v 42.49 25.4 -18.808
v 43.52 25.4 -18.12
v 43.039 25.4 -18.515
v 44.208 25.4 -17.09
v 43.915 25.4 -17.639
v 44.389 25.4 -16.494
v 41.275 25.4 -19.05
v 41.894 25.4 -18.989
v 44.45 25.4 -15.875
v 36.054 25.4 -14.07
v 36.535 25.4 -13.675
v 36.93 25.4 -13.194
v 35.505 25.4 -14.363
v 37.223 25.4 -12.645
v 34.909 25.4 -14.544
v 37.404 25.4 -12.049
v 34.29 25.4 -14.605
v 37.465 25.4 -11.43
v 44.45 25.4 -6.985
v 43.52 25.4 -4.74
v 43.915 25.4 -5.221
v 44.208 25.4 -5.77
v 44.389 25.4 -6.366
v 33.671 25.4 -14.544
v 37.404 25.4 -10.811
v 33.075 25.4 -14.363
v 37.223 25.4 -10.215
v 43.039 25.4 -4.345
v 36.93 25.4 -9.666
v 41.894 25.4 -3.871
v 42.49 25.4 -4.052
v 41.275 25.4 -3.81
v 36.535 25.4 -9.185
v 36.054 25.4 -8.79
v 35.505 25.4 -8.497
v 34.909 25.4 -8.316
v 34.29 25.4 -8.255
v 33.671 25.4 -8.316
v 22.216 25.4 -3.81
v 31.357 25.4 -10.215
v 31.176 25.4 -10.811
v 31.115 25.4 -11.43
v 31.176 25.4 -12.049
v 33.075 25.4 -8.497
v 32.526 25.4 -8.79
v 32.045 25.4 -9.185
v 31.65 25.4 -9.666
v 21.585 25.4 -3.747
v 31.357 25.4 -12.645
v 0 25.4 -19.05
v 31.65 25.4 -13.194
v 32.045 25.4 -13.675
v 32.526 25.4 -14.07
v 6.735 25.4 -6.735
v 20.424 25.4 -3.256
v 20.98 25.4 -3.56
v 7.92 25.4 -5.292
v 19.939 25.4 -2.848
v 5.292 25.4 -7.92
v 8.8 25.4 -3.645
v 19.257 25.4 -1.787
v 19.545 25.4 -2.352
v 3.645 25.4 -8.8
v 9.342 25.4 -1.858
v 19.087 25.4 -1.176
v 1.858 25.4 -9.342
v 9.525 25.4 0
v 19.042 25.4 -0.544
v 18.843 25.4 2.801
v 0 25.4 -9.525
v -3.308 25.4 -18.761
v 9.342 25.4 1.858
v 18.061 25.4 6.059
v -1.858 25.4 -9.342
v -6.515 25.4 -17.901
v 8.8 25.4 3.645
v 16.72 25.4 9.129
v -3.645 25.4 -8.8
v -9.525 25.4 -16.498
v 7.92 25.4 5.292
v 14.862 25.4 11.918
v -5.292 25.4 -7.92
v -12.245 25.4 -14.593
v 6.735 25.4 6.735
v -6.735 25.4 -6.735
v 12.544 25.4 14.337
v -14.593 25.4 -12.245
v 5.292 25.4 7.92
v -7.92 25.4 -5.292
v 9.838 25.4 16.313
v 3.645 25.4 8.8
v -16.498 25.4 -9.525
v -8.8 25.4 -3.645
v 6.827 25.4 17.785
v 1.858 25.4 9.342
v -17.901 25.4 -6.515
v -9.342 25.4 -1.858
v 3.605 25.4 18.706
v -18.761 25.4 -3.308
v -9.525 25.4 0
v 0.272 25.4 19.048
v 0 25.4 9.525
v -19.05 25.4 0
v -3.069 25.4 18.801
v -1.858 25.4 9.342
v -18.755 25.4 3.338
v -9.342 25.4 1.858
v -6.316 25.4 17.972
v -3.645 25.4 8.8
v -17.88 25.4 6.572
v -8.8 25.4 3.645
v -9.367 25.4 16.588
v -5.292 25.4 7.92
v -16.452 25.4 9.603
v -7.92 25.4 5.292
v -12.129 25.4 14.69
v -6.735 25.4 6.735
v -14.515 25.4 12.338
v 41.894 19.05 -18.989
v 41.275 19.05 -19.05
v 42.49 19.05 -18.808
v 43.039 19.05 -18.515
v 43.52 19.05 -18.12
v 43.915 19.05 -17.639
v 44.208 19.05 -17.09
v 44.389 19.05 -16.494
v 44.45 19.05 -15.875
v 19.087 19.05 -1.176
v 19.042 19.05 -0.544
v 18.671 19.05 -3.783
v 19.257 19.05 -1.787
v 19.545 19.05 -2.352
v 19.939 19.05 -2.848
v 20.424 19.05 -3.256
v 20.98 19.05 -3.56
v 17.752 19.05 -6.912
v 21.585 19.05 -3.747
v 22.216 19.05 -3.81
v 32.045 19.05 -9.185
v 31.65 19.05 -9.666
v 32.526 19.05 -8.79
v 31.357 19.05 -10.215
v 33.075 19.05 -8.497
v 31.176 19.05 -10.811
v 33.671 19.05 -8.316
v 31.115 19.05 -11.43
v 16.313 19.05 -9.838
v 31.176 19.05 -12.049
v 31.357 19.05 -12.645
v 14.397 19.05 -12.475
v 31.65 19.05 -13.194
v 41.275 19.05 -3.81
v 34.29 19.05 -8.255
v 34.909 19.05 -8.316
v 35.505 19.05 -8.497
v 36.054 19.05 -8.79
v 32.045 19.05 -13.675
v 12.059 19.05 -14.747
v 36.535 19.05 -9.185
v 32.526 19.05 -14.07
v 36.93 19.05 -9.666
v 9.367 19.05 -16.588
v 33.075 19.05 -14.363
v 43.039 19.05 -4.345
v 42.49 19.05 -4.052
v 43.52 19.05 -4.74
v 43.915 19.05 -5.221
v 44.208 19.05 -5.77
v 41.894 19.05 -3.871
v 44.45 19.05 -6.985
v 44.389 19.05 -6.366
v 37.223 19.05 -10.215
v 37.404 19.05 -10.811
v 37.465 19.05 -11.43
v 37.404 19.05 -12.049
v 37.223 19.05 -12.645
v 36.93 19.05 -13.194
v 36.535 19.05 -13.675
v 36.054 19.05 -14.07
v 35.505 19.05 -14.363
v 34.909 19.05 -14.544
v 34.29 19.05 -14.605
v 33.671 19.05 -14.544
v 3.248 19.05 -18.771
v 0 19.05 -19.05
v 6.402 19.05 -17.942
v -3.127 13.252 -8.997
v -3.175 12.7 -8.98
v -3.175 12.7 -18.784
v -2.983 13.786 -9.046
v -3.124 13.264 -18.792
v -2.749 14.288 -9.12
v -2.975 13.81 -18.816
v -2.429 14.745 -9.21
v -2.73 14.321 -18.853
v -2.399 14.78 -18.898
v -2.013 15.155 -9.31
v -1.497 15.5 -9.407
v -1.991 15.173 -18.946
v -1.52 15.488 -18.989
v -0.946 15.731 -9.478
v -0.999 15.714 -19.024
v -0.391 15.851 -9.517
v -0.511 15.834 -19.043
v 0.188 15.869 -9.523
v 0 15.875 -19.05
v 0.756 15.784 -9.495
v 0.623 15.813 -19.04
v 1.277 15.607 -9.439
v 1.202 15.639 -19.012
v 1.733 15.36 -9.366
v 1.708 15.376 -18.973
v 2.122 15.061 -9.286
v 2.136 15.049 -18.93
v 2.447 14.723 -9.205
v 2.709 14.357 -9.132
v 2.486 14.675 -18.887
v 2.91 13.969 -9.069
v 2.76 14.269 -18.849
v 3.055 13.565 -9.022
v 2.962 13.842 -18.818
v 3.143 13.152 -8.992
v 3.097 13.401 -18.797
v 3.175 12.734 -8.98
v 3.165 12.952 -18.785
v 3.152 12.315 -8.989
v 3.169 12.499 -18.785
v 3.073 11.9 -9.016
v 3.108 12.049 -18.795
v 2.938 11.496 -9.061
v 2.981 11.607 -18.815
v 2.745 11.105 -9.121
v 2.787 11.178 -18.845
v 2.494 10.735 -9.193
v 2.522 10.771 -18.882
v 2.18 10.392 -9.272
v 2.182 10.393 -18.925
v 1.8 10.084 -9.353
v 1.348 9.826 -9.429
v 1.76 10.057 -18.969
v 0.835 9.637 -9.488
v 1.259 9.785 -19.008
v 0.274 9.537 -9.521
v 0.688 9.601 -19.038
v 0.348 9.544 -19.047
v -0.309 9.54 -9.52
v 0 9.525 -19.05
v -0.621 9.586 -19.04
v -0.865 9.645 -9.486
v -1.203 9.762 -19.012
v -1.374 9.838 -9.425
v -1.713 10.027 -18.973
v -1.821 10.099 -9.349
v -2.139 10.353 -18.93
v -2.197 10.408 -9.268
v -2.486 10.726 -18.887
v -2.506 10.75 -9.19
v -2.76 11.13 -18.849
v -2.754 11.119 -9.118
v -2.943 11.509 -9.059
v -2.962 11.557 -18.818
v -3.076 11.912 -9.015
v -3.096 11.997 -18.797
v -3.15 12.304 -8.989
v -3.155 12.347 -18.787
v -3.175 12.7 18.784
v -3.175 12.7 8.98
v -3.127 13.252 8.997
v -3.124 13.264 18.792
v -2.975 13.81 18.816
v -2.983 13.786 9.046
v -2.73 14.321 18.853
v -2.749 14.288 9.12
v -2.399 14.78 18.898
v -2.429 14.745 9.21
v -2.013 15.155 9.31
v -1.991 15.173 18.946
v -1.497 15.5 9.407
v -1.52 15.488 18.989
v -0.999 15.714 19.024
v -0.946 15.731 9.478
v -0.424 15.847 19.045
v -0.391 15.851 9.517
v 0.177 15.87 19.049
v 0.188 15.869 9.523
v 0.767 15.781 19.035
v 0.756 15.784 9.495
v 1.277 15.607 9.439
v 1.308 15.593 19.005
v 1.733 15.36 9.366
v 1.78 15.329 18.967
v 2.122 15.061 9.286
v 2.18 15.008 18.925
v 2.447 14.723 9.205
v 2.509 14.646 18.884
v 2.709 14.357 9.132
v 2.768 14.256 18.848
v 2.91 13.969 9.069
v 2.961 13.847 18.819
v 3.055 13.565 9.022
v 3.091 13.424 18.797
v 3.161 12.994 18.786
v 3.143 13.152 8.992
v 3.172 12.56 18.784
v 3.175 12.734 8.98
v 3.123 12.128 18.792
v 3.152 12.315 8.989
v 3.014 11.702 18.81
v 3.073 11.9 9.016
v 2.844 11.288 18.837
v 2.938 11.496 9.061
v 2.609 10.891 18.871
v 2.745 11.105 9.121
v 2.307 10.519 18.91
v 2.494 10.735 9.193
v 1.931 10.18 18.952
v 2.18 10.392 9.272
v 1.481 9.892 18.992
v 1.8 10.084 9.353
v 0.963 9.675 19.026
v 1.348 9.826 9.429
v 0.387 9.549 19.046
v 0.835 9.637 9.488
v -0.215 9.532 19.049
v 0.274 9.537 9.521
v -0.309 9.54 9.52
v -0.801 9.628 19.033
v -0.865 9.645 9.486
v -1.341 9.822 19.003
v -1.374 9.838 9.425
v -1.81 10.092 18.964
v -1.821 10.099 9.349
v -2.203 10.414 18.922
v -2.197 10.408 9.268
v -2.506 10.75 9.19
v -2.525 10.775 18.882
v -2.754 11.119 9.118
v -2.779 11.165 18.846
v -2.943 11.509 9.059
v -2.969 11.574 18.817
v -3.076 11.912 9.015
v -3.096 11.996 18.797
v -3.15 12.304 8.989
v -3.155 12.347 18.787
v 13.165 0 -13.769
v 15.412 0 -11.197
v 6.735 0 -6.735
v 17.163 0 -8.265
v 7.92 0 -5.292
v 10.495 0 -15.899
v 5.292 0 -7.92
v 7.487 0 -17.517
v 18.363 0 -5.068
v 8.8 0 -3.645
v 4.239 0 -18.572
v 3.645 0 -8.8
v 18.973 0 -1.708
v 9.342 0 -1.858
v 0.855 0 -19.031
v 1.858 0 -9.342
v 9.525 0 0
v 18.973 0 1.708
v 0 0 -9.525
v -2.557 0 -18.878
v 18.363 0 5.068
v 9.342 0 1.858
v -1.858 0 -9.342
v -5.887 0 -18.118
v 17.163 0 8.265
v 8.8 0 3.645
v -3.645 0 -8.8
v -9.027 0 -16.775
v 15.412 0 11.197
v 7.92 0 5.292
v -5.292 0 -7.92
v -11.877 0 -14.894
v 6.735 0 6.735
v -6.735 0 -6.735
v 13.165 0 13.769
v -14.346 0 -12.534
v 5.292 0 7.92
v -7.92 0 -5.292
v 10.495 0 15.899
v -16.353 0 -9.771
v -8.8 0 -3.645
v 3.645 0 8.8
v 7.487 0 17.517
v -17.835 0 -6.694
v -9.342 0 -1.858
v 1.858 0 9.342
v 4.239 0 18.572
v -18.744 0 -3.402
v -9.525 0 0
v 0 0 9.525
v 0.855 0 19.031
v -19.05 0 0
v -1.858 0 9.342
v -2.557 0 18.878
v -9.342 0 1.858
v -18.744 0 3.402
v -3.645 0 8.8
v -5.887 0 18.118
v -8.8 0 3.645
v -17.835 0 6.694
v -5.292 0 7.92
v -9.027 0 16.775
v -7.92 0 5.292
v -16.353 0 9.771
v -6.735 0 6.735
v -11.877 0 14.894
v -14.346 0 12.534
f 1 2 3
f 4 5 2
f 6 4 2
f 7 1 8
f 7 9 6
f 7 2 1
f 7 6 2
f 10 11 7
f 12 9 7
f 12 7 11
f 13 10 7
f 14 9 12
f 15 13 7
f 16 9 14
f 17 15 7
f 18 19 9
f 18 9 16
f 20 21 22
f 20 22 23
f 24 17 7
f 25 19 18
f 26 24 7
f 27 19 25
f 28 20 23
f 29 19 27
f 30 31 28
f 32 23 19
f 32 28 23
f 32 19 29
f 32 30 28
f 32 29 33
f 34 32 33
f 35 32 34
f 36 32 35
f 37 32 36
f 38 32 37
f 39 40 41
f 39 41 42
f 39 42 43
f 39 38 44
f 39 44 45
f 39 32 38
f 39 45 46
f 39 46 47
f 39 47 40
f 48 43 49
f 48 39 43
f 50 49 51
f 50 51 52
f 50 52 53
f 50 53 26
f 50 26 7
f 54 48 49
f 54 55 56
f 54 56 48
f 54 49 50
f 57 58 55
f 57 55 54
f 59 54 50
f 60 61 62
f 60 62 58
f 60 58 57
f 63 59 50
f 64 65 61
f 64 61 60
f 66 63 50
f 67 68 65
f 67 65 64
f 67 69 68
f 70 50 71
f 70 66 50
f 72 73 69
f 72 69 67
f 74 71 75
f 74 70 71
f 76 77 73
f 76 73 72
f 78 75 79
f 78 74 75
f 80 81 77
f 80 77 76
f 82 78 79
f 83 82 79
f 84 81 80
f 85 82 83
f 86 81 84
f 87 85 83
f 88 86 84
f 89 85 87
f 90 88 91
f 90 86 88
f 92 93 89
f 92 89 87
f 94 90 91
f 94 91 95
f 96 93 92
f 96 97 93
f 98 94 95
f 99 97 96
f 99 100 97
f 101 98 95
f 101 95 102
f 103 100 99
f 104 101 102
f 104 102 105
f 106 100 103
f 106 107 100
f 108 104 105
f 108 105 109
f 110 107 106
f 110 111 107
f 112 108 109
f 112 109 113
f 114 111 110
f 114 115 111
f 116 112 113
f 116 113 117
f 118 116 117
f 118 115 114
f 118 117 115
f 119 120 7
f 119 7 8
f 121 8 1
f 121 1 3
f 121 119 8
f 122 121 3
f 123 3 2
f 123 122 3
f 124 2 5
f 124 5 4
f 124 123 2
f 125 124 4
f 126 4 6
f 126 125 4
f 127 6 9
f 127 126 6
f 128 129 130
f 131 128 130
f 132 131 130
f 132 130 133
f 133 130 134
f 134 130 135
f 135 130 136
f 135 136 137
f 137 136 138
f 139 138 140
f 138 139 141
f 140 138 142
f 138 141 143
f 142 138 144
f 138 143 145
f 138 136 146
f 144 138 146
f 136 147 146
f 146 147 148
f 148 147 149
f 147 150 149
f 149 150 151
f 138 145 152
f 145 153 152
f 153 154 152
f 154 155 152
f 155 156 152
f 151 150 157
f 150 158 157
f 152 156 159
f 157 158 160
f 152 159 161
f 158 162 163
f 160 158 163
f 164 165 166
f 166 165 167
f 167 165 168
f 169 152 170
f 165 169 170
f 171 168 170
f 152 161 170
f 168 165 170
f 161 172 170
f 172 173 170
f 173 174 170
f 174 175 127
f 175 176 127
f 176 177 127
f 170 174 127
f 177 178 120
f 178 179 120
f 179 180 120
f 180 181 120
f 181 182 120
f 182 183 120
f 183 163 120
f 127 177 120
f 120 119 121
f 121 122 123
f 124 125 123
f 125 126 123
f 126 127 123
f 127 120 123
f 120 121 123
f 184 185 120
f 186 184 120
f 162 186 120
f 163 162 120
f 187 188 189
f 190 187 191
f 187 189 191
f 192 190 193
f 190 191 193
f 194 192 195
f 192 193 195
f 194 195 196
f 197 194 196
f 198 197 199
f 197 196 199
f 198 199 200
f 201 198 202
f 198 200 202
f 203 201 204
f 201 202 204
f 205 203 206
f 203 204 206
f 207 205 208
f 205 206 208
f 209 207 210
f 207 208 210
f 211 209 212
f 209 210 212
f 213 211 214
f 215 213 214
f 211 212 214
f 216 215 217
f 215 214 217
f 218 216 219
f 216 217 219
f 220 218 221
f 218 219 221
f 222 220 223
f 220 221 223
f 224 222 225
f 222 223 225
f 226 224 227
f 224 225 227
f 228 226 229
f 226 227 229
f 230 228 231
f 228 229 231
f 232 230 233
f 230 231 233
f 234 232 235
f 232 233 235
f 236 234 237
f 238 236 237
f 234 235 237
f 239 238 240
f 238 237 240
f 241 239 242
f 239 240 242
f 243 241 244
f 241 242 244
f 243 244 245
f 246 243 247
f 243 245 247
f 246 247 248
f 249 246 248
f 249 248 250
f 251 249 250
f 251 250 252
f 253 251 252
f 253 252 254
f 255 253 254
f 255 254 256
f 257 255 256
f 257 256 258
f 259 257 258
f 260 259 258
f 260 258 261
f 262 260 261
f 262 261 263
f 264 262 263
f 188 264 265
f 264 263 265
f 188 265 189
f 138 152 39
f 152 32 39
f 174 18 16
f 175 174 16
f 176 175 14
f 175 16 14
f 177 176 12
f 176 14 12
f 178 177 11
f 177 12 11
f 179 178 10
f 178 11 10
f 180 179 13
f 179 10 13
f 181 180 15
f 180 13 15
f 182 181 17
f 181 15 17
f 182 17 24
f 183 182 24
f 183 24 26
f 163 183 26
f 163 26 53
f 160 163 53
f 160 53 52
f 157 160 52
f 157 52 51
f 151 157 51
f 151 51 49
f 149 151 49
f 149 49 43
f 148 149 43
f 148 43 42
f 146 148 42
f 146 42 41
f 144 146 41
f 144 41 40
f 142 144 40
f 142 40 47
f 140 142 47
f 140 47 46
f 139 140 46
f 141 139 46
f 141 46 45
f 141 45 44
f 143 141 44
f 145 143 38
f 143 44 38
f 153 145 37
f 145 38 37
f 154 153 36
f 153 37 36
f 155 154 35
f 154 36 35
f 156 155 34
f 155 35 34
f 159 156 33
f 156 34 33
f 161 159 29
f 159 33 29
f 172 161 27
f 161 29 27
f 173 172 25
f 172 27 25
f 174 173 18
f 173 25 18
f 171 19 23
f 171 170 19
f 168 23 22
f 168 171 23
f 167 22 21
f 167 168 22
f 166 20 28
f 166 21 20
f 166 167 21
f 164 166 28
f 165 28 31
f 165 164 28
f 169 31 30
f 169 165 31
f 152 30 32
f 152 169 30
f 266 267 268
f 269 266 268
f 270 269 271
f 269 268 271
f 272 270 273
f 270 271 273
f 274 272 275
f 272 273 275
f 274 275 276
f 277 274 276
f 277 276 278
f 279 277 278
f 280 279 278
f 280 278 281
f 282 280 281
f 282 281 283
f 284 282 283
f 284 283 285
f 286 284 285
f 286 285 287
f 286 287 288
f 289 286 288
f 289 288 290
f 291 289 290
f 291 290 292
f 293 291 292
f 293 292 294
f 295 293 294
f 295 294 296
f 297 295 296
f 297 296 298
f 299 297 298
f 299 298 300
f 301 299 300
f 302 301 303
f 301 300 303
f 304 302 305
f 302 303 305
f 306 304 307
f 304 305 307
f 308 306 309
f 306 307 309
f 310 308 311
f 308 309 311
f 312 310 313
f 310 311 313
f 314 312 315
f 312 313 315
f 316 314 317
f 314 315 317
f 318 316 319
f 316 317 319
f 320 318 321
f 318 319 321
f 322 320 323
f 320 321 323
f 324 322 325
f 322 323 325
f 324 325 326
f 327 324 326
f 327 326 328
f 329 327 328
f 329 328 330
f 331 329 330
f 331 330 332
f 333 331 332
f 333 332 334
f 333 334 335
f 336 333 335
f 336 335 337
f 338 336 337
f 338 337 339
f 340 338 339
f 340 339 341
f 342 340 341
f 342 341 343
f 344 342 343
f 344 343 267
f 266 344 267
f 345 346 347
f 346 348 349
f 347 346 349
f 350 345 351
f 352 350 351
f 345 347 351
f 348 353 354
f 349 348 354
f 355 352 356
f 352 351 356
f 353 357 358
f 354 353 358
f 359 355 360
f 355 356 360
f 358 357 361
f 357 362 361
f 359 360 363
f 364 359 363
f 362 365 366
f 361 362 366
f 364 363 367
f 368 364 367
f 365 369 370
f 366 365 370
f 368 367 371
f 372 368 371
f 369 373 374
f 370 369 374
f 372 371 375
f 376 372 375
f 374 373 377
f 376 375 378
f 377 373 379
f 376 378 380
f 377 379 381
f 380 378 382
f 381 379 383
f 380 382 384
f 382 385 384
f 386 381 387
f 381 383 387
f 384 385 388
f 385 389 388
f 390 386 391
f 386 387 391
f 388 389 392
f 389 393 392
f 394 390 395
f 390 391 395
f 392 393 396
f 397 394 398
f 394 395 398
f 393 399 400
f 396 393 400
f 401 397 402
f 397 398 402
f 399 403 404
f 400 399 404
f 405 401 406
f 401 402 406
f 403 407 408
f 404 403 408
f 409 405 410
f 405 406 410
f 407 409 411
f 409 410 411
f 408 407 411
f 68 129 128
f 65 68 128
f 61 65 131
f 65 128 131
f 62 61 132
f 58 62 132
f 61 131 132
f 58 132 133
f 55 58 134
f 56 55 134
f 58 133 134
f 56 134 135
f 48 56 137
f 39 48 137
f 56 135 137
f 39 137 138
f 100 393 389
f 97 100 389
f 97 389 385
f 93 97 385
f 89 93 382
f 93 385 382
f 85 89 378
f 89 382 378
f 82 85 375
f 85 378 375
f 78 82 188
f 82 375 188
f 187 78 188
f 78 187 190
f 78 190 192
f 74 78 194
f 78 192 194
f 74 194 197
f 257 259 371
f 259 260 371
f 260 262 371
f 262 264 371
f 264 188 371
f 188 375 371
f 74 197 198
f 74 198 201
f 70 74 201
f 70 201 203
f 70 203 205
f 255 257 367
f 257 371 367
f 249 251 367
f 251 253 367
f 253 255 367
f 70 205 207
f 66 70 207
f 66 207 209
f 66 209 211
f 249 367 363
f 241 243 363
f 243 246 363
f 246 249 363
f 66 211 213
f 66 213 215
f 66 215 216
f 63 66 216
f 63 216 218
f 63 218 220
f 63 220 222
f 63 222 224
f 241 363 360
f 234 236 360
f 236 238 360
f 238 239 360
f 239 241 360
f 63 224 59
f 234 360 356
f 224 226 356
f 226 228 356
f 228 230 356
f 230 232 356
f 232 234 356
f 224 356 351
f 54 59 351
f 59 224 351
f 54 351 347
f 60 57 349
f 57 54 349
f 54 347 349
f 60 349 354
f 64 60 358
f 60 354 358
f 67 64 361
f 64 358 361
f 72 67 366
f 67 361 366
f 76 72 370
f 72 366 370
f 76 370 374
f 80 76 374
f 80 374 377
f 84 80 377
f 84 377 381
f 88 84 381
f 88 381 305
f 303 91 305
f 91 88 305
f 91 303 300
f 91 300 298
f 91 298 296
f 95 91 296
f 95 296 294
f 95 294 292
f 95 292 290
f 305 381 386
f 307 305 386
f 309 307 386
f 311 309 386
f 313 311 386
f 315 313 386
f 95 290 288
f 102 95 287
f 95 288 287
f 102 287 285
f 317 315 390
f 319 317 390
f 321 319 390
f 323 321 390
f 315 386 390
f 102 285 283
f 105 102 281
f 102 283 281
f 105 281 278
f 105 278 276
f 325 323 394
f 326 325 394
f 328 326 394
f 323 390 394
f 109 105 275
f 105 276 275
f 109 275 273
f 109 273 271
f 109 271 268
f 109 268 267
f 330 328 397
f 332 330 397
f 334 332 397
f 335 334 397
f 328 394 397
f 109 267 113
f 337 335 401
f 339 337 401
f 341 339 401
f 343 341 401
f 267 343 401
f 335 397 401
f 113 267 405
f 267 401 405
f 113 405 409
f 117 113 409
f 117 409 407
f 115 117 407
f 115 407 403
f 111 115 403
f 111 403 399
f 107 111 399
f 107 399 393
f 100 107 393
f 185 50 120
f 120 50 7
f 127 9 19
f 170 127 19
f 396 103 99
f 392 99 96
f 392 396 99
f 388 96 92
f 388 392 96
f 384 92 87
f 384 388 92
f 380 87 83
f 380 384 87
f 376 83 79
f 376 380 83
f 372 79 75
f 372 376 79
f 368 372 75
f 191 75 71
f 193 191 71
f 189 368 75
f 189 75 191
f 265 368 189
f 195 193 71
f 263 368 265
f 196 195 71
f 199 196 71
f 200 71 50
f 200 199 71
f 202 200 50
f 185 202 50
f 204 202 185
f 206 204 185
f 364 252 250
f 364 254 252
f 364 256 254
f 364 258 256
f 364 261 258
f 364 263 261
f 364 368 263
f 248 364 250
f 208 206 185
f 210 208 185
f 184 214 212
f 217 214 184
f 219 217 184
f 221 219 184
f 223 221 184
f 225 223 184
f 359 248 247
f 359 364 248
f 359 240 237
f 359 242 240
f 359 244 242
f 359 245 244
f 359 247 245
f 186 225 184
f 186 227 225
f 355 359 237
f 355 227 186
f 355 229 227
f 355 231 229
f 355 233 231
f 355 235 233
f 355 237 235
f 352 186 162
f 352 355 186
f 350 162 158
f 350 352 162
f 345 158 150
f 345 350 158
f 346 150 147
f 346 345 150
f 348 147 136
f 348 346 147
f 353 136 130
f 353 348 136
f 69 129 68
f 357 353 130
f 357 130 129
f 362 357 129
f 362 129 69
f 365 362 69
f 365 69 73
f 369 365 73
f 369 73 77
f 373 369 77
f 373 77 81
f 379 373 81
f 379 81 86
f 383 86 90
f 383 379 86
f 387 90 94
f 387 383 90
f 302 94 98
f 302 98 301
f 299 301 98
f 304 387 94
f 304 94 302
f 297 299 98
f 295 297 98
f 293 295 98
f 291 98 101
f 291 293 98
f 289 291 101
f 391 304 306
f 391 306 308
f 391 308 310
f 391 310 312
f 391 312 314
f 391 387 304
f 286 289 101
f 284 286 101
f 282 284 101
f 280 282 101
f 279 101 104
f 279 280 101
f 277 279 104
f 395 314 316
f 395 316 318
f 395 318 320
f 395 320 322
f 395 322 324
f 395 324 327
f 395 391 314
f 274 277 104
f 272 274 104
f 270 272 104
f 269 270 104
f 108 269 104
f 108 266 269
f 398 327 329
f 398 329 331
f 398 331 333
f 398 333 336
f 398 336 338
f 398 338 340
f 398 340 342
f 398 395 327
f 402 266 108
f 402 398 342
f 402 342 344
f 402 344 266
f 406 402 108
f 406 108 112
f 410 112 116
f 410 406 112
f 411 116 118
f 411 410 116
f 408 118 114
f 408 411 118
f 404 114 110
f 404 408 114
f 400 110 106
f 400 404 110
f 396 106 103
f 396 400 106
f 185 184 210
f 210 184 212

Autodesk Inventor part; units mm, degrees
ref_plane "YZ Plane" through (0, 0, 0) normal (1, 0, 0) x (0, 1, 0)
ref_plane "XZ Plane" through (0, 0, 0) normal (0, 1, 0) x (-1, 0, 0)
ref_plane "XY Plane" through (0, 0, 0) normal (0, 0, 1) x (1, 0, 0)
sketch "Sketch1" plane through (0, 0, 0) normal (0, 1, 0) x (-1, 0, 0)
  circle A0 centre (0, 0) radius 19.05
  circle A1 centre (0, 0) radius 9.525
  dimension "d0" = 38.1
  dimension "d1" = 19.05
extrude "Extrusion1" add sketch "Sketch1" along normal blind 25.4
sketch "Sketch2" plane through (0, 25.4, 0) normal (0, 1, 0) x (1, 0, 0)
  circle A0 centre (0, 0) radius 19.05 projected
  line L0 (0, 19.05) -> (44.45, 19.05)
  line L1 (44.45, 19.05) -> (44.45, 3.81)
  line L2 (44.45, 3.81) -> (18.6651, 3.81)
  line L3 (44.45, 11.43) -> (15.24, 11.43)
  circle A1 centre (34.29, 11.43) radius 3.175
  dimension "d4" = 44.45
  dimension "d5" = 15.24
  dimension "d6" = 6.35
  dimension "d7" = 10.16
extrude "Extrusion2" add sketch "Sketch2" against normal blind 6.35 contours A0 L3 A1 L1 L2 | L0 L1 L3 A1 A0
fillet "Fillet1" radius 3.175 3 edges at (18.6651, 22.225, -3.81) (44.45, 22.225, -3.81) (44.45, 22.225, -19.05)
sketch "Sketch3" plane through (0, 19.05, -19.05) normal (0, 0, -1) x (-1, 0, 0)
  circle A0 centre (0, -6.35) radius 3.175
  line L0 (19.05, -19.05) -> (-19.05, -19.05) projected
  point P0 (0, -19.05)
  point P1 (0, -19.05)
  dimension "d11" = 12.7
  dimension "d12" = 6.35
extrude "Extrusion3" cut sketch "Sketch3" against normal through all
properties part number "ShaftGuide" material "Aluminum 6061"
